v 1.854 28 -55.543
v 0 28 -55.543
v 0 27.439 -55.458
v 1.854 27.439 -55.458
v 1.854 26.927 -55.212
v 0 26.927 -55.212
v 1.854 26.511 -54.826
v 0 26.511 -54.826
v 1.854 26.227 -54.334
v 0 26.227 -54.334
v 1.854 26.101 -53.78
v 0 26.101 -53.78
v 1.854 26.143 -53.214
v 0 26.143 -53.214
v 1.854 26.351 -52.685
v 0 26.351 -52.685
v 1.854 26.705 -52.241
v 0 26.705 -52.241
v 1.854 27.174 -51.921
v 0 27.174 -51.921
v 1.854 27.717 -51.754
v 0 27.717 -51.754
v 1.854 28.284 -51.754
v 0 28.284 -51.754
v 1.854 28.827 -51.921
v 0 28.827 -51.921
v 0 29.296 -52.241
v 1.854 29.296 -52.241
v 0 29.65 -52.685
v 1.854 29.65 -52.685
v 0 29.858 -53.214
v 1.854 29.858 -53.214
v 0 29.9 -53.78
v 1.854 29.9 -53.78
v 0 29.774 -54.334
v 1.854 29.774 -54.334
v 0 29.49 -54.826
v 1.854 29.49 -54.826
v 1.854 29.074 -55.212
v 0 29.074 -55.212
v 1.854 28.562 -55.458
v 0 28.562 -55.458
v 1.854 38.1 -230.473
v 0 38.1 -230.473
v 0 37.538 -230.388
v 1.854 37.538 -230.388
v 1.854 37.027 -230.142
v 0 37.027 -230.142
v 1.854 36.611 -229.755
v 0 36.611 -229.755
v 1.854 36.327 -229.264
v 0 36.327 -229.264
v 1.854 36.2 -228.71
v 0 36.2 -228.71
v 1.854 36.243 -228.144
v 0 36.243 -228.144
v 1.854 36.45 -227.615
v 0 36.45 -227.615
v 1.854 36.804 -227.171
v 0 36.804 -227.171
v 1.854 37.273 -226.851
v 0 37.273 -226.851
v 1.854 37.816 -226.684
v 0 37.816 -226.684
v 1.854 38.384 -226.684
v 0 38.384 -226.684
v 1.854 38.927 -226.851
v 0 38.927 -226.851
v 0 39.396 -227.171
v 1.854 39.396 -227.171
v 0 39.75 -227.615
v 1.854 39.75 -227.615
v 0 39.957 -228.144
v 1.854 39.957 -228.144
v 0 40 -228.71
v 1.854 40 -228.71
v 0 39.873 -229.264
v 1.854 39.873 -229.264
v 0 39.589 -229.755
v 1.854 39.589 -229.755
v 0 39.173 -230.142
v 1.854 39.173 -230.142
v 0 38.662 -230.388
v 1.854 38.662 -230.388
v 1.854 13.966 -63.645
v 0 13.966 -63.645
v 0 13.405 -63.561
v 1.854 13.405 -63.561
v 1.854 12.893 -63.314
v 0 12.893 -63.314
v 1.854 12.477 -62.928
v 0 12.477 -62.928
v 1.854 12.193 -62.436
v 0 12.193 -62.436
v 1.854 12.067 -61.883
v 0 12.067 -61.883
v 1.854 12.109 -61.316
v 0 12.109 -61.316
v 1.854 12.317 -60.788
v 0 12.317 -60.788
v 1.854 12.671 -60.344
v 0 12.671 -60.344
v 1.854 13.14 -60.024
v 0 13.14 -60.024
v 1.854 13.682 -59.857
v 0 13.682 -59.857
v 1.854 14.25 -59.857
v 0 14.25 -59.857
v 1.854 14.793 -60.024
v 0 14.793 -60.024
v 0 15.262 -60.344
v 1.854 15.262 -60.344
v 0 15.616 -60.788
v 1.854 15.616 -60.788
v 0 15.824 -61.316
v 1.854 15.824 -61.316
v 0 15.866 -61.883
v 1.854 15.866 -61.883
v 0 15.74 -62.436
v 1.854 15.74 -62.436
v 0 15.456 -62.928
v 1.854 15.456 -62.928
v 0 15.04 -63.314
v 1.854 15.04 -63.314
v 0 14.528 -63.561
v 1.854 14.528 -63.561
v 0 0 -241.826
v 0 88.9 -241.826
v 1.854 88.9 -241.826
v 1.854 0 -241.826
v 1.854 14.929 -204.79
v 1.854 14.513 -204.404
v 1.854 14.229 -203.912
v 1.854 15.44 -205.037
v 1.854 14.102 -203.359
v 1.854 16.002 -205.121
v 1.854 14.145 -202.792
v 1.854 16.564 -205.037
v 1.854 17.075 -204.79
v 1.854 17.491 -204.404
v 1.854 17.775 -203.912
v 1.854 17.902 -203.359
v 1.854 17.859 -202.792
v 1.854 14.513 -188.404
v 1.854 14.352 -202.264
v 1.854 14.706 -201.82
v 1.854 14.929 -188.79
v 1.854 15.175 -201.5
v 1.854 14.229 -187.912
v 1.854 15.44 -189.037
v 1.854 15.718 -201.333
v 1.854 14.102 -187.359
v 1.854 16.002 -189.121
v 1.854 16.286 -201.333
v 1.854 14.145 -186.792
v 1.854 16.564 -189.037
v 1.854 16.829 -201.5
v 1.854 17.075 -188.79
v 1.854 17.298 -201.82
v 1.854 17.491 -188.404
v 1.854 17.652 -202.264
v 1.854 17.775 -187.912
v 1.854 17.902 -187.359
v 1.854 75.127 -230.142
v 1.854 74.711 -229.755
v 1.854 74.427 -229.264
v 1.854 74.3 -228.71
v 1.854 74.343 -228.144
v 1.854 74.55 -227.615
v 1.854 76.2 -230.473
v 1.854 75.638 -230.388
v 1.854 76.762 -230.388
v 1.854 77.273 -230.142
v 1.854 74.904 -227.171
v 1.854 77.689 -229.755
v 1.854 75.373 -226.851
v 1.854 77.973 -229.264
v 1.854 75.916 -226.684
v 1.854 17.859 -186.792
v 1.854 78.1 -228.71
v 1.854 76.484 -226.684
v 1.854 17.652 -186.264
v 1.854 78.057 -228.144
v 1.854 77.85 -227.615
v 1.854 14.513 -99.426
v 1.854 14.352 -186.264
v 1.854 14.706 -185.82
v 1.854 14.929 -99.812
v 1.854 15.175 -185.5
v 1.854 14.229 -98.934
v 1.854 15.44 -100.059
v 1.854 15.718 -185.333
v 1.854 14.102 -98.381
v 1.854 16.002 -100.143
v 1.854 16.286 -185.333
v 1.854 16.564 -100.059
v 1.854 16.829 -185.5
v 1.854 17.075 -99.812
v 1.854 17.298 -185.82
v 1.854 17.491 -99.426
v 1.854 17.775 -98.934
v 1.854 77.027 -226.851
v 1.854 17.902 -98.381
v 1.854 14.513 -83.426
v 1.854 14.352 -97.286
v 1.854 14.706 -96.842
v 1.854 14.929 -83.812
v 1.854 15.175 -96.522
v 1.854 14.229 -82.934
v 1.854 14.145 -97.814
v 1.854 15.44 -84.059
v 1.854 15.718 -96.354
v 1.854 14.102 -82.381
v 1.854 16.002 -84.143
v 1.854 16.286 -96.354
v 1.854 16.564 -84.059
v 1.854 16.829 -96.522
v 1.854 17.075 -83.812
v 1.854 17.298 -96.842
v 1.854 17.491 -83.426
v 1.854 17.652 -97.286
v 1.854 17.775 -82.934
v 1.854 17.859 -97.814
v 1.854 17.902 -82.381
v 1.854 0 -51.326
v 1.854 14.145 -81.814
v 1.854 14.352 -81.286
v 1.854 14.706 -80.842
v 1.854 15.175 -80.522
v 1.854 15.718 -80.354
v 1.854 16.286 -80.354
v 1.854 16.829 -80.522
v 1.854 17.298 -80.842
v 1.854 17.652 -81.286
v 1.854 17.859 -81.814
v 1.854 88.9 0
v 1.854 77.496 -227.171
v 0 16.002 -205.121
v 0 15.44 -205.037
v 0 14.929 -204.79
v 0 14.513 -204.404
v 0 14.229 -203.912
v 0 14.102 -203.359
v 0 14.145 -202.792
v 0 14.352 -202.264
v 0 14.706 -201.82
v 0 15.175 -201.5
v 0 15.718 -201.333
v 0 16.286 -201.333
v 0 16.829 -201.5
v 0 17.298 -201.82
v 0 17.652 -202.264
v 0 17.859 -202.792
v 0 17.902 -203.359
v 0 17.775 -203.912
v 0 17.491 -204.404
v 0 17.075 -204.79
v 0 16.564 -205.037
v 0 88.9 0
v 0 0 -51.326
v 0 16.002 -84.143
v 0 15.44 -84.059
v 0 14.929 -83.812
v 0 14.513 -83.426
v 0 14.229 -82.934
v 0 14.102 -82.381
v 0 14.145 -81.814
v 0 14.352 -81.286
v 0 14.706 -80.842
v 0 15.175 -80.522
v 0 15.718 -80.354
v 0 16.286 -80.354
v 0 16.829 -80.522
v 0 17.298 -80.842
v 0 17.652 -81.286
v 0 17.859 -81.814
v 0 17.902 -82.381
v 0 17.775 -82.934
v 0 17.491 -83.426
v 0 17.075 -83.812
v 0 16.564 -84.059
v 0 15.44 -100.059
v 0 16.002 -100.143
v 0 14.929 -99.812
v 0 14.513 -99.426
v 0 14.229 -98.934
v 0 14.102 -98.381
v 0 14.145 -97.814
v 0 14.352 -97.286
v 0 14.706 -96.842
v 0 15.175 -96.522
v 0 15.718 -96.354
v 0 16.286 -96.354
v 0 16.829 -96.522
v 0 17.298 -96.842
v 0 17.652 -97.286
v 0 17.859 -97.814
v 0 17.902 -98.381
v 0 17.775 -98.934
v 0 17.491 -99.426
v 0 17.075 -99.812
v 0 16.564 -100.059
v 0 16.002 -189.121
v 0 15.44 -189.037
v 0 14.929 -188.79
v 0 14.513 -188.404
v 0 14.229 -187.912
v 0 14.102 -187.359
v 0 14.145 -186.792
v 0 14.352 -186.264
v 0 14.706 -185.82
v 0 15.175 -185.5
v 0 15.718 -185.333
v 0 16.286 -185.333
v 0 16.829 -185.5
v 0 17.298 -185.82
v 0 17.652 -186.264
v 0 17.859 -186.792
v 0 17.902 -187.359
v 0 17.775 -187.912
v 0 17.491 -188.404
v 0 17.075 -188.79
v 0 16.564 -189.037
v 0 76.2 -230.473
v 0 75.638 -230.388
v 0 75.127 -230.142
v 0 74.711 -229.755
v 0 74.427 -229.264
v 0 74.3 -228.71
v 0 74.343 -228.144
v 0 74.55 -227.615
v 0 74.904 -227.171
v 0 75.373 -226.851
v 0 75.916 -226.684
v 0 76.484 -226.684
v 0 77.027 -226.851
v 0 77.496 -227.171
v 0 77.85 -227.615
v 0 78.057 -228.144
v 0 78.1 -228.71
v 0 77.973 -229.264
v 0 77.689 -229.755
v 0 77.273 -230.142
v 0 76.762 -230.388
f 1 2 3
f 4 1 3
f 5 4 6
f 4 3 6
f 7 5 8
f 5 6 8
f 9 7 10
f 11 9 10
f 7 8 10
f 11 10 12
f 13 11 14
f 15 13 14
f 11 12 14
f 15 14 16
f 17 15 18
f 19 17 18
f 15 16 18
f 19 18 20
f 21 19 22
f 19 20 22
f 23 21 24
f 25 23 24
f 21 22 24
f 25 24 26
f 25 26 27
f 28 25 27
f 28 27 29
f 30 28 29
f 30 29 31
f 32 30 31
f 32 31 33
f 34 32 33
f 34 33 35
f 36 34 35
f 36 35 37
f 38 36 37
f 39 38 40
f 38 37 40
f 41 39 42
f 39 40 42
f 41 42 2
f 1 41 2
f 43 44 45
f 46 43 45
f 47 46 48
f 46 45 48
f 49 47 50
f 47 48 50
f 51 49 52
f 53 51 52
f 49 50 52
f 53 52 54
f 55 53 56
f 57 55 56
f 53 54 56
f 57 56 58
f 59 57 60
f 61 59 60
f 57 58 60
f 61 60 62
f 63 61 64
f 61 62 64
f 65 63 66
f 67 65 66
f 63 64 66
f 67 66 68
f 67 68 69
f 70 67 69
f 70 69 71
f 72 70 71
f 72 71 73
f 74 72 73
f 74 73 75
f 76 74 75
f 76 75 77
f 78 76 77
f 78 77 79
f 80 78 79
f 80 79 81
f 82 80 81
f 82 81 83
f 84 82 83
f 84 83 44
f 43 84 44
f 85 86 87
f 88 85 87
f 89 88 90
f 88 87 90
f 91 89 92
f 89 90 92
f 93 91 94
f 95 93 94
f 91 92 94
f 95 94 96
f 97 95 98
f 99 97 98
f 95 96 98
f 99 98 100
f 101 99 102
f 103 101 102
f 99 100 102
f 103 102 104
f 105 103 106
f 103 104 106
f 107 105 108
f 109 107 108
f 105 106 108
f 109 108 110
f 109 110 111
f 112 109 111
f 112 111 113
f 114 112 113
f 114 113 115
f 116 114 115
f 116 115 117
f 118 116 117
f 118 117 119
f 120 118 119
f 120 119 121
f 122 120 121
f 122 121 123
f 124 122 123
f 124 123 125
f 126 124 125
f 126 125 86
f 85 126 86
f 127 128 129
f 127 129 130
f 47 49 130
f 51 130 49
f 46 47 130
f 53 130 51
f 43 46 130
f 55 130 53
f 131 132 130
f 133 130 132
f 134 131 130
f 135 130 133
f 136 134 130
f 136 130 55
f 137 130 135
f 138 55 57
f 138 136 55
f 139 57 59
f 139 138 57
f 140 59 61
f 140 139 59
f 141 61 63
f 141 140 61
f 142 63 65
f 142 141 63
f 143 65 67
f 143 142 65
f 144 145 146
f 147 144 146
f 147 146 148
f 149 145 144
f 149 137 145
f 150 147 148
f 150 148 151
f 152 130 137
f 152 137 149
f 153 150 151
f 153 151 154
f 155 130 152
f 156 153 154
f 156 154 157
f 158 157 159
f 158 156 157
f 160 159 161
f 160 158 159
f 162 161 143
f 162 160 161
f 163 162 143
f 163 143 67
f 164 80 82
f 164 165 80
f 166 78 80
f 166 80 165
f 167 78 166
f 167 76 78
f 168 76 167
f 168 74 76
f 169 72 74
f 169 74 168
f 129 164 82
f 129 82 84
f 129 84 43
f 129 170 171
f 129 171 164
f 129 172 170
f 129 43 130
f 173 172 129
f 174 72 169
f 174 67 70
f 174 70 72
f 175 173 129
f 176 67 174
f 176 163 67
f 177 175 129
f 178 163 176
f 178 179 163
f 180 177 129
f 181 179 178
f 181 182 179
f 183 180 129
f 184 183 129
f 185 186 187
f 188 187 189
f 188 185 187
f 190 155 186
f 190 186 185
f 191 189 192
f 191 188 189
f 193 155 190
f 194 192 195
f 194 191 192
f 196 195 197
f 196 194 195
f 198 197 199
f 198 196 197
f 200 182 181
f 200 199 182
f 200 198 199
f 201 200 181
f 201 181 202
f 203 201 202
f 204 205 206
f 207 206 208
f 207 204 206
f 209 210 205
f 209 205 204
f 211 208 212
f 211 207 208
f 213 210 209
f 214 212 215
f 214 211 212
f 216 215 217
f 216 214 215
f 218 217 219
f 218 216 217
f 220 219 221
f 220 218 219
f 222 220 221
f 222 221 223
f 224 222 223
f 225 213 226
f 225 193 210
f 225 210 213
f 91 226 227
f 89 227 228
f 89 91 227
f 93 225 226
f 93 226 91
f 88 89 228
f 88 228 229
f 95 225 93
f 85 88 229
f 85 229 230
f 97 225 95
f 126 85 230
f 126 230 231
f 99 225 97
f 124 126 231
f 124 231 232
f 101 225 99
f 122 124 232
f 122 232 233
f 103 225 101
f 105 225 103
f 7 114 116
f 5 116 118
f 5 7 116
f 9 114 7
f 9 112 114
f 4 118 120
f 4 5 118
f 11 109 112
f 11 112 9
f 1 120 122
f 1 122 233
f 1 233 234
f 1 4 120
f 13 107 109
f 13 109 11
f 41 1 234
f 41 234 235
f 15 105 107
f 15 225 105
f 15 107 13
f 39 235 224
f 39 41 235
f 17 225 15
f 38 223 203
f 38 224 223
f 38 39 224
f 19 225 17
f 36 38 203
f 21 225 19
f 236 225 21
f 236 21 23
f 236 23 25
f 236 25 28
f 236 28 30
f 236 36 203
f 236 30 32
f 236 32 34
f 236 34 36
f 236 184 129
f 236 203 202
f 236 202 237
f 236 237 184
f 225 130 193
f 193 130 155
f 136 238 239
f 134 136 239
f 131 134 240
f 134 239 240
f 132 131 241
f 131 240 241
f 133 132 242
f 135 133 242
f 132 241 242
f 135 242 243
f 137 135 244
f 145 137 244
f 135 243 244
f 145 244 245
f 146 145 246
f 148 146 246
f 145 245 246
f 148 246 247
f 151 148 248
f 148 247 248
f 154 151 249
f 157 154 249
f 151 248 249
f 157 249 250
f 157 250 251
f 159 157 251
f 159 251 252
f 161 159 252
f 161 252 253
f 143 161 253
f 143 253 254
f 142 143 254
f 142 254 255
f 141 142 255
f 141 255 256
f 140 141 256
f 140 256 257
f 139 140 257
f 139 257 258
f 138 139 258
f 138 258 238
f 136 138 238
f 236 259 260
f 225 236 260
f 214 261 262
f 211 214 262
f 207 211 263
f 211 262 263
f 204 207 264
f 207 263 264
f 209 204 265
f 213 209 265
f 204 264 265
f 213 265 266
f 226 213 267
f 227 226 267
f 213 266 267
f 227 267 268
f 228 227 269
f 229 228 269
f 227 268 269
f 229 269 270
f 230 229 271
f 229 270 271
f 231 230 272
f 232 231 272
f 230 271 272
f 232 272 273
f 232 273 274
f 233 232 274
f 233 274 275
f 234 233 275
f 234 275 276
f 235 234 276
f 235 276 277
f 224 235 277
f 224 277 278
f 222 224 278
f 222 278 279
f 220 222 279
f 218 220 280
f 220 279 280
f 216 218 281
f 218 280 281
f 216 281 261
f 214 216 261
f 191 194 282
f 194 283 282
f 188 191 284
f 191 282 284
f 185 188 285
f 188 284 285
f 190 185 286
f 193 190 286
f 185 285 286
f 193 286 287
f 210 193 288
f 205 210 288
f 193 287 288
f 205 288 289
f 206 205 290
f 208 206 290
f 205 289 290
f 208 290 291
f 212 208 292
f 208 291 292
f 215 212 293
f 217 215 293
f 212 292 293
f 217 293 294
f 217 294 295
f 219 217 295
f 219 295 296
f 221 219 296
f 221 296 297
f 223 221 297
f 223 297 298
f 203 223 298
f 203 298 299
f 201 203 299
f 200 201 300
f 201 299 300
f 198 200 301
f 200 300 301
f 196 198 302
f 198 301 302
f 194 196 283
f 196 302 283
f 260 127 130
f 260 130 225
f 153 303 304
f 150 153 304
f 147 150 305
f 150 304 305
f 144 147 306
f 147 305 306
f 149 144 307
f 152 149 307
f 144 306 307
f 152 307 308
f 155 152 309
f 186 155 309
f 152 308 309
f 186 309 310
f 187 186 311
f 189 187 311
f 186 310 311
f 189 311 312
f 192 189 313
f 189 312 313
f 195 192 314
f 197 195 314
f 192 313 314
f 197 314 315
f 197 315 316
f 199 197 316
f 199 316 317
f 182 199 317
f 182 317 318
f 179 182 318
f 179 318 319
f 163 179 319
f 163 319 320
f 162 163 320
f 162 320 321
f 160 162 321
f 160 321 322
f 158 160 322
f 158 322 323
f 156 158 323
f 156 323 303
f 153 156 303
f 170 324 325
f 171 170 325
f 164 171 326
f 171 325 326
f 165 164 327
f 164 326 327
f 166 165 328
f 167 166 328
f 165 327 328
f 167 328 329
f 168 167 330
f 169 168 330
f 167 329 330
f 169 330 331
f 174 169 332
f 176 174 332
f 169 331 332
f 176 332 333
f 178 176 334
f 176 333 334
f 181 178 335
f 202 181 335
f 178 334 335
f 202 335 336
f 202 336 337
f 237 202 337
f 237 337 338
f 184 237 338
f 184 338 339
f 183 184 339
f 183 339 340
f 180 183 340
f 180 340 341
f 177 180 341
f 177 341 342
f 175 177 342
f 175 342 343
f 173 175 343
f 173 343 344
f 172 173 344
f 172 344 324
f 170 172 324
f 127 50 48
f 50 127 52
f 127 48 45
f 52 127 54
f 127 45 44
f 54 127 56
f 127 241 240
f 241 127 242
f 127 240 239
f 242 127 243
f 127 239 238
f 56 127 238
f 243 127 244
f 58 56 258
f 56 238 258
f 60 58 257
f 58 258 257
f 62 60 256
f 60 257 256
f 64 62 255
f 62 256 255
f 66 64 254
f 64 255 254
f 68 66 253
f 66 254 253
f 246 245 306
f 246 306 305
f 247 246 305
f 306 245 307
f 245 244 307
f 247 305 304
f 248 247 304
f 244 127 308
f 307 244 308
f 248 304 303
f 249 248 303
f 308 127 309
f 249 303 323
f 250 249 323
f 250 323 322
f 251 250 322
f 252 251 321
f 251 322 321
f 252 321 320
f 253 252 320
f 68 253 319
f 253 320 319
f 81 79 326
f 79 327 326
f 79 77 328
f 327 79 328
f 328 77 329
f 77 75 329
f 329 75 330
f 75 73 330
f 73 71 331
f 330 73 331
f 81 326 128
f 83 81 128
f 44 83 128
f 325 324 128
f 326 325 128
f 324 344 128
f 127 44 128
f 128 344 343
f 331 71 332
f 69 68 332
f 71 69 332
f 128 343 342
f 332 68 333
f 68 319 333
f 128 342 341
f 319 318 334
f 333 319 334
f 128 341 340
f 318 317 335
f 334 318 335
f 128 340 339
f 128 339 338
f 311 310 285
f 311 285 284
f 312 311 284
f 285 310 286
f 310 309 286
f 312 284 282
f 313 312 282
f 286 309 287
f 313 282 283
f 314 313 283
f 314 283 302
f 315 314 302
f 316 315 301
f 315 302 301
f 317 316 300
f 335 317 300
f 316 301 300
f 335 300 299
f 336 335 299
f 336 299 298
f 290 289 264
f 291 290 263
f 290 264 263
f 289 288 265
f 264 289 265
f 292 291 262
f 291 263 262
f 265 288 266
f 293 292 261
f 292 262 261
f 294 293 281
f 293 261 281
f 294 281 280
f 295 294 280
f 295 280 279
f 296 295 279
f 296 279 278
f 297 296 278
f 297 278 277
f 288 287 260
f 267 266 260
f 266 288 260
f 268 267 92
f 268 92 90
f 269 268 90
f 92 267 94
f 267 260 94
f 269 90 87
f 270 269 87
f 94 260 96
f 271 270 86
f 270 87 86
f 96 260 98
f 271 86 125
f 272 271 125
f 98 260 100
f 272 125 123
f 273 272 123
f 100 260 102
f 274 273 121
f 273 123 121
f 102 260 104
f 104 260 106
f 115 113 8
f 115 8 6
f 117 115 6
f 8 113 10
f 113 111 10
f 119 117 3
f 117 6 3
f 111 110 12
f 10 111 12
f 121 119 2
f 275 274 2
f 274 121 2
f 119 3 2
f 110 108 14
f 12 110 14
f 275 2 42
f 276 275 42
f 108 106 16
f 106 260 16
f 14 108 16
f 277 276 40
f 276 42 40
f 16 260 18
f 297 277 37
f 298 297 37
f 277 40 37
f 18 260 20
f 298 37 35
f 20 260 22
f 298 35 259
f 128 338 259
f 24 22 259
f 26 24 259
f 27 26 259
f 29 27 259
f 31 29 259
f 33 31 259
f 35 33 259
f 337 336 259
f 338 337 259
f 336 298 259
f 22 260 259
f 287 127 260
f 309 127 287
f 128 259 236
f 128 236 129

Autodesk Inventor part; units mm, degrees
ref_plane "YZ Plane" through (0, 0, 0) normal (1, 0, 0) x (0, 1, 0)
ref_plane "XZ Plane" through (0, 0, 0) normal (0, 1, 0) x (-1, 0, 0)
ref_plane "XY Plane" through (0, 0, 0) normal (0, 0, 1) x (1, 0, 0)
sketch "Sketch1" plane through (0, 0, 0) normal (1, 0, 0) x (0, 1, 0)
  line L0 (0, 0) -> (88.9, 0)
  line L1 (88.9, 0) -> (88.9, -241.8264)
  line L2 (88.9, -241.8264) -> (0, -241.8264)
  line L3 (0, -241.8264) -> (0, 0)
  line L4 (88.9, 0) -> (0, -51.3264)
  line L5 (88.9, 0) -> (191.5529, 0) construction
  dimension "d0" = 88.9
  dimension "d2" = 150
  dimension "d5" = 190.5
extrude "Extrusion1" add sketch "Sketch1" along normal blind 1.8542 contours L1 L2 L3 L4
sketch "Sketch2" plane through (1.8542, 0, 0) normal (1, 0, 0) x (0, 0, -1)
  line L0 (241.8264, 0) -> (241.8264, 88.9) projected
  line L1 (51.3264, 0) -> (241.8264, 0) projected
  line L2 (0, 88.9) -> (51.3264, 0) projected
  point P0 (0, 0)
  point P1 (82.2382, 16.002)
  point P2 (98.2382, 16.002)
  point P3 (187.2164, 16.002)
  point P4 (203.2164, 16.002)
  point P5 (53.6378, 28.0005)
  point P6 (61.7404, 13.9664)
  dimension "d6" = 16
  dimension "d8" = 16
  dimension "d9" = 16.002
  dimension "d10" = 16.002
  dimension "d11" = 16.002
  dimension "d12" = 16.002
  dimension "d13" = 159.5882
  dimension "d14" = 54.61
  dimension "d22" = 16.002
  dimension "d23" = 16.002
  dimension "d24" = 188.1886
  dimension "d25" = 180.086
hole "Hole1" at (1.8542, 16.002, -82.2382) at (1.8542, 16.002, -98.2382) at (1.8542, 16.002, -187.2164) at (1.8542, 16.002, -203.2164) at (1.8542, 28.0005, -53.6378) at (1.8542, 13.9664, -61.7404) direction (-1, 0, 0) diameter 3.81 depth 10.9728 tip angle 118
sketch "Sketch3" plane through (1.8542, 0, 0) normal (1, 0, 0) x (0, 0, -1)
  line L0 (241.8264, 0) -> (241.8264, 88.9) projected
  line L1 (51.3264, 0) -> (241.8264, 0) projected
  point P0 (0, 0)
  point P1 (228.5676, 76.2)
  point P2 (228.5676, 38.1)
  dimension "d26" = 13.2588
  dimension "d27" = 13.2588
  dimension "d28" = 76.2
  dimension "d29" = 38.1
hole "Hole2" at (1.8542, 76.2, -228.5676) at (1.8542, 38.1, -228.5676) direction (-1, 0, 0) diameter 3.81 depth 10.9728 tip angle 118
equation "\"d8\" = d6"
equation "\"d10\" = d9"
equation "\"d11\" = d9"
equation "\"d12\" = d9"
equation "\"d22\" = d11"
equation "\"d23\" = d22"
equation "\"d27\" = d26"
properties part number "PaddleCollection2.1Casing" material "Polycarbonate, Clear"
